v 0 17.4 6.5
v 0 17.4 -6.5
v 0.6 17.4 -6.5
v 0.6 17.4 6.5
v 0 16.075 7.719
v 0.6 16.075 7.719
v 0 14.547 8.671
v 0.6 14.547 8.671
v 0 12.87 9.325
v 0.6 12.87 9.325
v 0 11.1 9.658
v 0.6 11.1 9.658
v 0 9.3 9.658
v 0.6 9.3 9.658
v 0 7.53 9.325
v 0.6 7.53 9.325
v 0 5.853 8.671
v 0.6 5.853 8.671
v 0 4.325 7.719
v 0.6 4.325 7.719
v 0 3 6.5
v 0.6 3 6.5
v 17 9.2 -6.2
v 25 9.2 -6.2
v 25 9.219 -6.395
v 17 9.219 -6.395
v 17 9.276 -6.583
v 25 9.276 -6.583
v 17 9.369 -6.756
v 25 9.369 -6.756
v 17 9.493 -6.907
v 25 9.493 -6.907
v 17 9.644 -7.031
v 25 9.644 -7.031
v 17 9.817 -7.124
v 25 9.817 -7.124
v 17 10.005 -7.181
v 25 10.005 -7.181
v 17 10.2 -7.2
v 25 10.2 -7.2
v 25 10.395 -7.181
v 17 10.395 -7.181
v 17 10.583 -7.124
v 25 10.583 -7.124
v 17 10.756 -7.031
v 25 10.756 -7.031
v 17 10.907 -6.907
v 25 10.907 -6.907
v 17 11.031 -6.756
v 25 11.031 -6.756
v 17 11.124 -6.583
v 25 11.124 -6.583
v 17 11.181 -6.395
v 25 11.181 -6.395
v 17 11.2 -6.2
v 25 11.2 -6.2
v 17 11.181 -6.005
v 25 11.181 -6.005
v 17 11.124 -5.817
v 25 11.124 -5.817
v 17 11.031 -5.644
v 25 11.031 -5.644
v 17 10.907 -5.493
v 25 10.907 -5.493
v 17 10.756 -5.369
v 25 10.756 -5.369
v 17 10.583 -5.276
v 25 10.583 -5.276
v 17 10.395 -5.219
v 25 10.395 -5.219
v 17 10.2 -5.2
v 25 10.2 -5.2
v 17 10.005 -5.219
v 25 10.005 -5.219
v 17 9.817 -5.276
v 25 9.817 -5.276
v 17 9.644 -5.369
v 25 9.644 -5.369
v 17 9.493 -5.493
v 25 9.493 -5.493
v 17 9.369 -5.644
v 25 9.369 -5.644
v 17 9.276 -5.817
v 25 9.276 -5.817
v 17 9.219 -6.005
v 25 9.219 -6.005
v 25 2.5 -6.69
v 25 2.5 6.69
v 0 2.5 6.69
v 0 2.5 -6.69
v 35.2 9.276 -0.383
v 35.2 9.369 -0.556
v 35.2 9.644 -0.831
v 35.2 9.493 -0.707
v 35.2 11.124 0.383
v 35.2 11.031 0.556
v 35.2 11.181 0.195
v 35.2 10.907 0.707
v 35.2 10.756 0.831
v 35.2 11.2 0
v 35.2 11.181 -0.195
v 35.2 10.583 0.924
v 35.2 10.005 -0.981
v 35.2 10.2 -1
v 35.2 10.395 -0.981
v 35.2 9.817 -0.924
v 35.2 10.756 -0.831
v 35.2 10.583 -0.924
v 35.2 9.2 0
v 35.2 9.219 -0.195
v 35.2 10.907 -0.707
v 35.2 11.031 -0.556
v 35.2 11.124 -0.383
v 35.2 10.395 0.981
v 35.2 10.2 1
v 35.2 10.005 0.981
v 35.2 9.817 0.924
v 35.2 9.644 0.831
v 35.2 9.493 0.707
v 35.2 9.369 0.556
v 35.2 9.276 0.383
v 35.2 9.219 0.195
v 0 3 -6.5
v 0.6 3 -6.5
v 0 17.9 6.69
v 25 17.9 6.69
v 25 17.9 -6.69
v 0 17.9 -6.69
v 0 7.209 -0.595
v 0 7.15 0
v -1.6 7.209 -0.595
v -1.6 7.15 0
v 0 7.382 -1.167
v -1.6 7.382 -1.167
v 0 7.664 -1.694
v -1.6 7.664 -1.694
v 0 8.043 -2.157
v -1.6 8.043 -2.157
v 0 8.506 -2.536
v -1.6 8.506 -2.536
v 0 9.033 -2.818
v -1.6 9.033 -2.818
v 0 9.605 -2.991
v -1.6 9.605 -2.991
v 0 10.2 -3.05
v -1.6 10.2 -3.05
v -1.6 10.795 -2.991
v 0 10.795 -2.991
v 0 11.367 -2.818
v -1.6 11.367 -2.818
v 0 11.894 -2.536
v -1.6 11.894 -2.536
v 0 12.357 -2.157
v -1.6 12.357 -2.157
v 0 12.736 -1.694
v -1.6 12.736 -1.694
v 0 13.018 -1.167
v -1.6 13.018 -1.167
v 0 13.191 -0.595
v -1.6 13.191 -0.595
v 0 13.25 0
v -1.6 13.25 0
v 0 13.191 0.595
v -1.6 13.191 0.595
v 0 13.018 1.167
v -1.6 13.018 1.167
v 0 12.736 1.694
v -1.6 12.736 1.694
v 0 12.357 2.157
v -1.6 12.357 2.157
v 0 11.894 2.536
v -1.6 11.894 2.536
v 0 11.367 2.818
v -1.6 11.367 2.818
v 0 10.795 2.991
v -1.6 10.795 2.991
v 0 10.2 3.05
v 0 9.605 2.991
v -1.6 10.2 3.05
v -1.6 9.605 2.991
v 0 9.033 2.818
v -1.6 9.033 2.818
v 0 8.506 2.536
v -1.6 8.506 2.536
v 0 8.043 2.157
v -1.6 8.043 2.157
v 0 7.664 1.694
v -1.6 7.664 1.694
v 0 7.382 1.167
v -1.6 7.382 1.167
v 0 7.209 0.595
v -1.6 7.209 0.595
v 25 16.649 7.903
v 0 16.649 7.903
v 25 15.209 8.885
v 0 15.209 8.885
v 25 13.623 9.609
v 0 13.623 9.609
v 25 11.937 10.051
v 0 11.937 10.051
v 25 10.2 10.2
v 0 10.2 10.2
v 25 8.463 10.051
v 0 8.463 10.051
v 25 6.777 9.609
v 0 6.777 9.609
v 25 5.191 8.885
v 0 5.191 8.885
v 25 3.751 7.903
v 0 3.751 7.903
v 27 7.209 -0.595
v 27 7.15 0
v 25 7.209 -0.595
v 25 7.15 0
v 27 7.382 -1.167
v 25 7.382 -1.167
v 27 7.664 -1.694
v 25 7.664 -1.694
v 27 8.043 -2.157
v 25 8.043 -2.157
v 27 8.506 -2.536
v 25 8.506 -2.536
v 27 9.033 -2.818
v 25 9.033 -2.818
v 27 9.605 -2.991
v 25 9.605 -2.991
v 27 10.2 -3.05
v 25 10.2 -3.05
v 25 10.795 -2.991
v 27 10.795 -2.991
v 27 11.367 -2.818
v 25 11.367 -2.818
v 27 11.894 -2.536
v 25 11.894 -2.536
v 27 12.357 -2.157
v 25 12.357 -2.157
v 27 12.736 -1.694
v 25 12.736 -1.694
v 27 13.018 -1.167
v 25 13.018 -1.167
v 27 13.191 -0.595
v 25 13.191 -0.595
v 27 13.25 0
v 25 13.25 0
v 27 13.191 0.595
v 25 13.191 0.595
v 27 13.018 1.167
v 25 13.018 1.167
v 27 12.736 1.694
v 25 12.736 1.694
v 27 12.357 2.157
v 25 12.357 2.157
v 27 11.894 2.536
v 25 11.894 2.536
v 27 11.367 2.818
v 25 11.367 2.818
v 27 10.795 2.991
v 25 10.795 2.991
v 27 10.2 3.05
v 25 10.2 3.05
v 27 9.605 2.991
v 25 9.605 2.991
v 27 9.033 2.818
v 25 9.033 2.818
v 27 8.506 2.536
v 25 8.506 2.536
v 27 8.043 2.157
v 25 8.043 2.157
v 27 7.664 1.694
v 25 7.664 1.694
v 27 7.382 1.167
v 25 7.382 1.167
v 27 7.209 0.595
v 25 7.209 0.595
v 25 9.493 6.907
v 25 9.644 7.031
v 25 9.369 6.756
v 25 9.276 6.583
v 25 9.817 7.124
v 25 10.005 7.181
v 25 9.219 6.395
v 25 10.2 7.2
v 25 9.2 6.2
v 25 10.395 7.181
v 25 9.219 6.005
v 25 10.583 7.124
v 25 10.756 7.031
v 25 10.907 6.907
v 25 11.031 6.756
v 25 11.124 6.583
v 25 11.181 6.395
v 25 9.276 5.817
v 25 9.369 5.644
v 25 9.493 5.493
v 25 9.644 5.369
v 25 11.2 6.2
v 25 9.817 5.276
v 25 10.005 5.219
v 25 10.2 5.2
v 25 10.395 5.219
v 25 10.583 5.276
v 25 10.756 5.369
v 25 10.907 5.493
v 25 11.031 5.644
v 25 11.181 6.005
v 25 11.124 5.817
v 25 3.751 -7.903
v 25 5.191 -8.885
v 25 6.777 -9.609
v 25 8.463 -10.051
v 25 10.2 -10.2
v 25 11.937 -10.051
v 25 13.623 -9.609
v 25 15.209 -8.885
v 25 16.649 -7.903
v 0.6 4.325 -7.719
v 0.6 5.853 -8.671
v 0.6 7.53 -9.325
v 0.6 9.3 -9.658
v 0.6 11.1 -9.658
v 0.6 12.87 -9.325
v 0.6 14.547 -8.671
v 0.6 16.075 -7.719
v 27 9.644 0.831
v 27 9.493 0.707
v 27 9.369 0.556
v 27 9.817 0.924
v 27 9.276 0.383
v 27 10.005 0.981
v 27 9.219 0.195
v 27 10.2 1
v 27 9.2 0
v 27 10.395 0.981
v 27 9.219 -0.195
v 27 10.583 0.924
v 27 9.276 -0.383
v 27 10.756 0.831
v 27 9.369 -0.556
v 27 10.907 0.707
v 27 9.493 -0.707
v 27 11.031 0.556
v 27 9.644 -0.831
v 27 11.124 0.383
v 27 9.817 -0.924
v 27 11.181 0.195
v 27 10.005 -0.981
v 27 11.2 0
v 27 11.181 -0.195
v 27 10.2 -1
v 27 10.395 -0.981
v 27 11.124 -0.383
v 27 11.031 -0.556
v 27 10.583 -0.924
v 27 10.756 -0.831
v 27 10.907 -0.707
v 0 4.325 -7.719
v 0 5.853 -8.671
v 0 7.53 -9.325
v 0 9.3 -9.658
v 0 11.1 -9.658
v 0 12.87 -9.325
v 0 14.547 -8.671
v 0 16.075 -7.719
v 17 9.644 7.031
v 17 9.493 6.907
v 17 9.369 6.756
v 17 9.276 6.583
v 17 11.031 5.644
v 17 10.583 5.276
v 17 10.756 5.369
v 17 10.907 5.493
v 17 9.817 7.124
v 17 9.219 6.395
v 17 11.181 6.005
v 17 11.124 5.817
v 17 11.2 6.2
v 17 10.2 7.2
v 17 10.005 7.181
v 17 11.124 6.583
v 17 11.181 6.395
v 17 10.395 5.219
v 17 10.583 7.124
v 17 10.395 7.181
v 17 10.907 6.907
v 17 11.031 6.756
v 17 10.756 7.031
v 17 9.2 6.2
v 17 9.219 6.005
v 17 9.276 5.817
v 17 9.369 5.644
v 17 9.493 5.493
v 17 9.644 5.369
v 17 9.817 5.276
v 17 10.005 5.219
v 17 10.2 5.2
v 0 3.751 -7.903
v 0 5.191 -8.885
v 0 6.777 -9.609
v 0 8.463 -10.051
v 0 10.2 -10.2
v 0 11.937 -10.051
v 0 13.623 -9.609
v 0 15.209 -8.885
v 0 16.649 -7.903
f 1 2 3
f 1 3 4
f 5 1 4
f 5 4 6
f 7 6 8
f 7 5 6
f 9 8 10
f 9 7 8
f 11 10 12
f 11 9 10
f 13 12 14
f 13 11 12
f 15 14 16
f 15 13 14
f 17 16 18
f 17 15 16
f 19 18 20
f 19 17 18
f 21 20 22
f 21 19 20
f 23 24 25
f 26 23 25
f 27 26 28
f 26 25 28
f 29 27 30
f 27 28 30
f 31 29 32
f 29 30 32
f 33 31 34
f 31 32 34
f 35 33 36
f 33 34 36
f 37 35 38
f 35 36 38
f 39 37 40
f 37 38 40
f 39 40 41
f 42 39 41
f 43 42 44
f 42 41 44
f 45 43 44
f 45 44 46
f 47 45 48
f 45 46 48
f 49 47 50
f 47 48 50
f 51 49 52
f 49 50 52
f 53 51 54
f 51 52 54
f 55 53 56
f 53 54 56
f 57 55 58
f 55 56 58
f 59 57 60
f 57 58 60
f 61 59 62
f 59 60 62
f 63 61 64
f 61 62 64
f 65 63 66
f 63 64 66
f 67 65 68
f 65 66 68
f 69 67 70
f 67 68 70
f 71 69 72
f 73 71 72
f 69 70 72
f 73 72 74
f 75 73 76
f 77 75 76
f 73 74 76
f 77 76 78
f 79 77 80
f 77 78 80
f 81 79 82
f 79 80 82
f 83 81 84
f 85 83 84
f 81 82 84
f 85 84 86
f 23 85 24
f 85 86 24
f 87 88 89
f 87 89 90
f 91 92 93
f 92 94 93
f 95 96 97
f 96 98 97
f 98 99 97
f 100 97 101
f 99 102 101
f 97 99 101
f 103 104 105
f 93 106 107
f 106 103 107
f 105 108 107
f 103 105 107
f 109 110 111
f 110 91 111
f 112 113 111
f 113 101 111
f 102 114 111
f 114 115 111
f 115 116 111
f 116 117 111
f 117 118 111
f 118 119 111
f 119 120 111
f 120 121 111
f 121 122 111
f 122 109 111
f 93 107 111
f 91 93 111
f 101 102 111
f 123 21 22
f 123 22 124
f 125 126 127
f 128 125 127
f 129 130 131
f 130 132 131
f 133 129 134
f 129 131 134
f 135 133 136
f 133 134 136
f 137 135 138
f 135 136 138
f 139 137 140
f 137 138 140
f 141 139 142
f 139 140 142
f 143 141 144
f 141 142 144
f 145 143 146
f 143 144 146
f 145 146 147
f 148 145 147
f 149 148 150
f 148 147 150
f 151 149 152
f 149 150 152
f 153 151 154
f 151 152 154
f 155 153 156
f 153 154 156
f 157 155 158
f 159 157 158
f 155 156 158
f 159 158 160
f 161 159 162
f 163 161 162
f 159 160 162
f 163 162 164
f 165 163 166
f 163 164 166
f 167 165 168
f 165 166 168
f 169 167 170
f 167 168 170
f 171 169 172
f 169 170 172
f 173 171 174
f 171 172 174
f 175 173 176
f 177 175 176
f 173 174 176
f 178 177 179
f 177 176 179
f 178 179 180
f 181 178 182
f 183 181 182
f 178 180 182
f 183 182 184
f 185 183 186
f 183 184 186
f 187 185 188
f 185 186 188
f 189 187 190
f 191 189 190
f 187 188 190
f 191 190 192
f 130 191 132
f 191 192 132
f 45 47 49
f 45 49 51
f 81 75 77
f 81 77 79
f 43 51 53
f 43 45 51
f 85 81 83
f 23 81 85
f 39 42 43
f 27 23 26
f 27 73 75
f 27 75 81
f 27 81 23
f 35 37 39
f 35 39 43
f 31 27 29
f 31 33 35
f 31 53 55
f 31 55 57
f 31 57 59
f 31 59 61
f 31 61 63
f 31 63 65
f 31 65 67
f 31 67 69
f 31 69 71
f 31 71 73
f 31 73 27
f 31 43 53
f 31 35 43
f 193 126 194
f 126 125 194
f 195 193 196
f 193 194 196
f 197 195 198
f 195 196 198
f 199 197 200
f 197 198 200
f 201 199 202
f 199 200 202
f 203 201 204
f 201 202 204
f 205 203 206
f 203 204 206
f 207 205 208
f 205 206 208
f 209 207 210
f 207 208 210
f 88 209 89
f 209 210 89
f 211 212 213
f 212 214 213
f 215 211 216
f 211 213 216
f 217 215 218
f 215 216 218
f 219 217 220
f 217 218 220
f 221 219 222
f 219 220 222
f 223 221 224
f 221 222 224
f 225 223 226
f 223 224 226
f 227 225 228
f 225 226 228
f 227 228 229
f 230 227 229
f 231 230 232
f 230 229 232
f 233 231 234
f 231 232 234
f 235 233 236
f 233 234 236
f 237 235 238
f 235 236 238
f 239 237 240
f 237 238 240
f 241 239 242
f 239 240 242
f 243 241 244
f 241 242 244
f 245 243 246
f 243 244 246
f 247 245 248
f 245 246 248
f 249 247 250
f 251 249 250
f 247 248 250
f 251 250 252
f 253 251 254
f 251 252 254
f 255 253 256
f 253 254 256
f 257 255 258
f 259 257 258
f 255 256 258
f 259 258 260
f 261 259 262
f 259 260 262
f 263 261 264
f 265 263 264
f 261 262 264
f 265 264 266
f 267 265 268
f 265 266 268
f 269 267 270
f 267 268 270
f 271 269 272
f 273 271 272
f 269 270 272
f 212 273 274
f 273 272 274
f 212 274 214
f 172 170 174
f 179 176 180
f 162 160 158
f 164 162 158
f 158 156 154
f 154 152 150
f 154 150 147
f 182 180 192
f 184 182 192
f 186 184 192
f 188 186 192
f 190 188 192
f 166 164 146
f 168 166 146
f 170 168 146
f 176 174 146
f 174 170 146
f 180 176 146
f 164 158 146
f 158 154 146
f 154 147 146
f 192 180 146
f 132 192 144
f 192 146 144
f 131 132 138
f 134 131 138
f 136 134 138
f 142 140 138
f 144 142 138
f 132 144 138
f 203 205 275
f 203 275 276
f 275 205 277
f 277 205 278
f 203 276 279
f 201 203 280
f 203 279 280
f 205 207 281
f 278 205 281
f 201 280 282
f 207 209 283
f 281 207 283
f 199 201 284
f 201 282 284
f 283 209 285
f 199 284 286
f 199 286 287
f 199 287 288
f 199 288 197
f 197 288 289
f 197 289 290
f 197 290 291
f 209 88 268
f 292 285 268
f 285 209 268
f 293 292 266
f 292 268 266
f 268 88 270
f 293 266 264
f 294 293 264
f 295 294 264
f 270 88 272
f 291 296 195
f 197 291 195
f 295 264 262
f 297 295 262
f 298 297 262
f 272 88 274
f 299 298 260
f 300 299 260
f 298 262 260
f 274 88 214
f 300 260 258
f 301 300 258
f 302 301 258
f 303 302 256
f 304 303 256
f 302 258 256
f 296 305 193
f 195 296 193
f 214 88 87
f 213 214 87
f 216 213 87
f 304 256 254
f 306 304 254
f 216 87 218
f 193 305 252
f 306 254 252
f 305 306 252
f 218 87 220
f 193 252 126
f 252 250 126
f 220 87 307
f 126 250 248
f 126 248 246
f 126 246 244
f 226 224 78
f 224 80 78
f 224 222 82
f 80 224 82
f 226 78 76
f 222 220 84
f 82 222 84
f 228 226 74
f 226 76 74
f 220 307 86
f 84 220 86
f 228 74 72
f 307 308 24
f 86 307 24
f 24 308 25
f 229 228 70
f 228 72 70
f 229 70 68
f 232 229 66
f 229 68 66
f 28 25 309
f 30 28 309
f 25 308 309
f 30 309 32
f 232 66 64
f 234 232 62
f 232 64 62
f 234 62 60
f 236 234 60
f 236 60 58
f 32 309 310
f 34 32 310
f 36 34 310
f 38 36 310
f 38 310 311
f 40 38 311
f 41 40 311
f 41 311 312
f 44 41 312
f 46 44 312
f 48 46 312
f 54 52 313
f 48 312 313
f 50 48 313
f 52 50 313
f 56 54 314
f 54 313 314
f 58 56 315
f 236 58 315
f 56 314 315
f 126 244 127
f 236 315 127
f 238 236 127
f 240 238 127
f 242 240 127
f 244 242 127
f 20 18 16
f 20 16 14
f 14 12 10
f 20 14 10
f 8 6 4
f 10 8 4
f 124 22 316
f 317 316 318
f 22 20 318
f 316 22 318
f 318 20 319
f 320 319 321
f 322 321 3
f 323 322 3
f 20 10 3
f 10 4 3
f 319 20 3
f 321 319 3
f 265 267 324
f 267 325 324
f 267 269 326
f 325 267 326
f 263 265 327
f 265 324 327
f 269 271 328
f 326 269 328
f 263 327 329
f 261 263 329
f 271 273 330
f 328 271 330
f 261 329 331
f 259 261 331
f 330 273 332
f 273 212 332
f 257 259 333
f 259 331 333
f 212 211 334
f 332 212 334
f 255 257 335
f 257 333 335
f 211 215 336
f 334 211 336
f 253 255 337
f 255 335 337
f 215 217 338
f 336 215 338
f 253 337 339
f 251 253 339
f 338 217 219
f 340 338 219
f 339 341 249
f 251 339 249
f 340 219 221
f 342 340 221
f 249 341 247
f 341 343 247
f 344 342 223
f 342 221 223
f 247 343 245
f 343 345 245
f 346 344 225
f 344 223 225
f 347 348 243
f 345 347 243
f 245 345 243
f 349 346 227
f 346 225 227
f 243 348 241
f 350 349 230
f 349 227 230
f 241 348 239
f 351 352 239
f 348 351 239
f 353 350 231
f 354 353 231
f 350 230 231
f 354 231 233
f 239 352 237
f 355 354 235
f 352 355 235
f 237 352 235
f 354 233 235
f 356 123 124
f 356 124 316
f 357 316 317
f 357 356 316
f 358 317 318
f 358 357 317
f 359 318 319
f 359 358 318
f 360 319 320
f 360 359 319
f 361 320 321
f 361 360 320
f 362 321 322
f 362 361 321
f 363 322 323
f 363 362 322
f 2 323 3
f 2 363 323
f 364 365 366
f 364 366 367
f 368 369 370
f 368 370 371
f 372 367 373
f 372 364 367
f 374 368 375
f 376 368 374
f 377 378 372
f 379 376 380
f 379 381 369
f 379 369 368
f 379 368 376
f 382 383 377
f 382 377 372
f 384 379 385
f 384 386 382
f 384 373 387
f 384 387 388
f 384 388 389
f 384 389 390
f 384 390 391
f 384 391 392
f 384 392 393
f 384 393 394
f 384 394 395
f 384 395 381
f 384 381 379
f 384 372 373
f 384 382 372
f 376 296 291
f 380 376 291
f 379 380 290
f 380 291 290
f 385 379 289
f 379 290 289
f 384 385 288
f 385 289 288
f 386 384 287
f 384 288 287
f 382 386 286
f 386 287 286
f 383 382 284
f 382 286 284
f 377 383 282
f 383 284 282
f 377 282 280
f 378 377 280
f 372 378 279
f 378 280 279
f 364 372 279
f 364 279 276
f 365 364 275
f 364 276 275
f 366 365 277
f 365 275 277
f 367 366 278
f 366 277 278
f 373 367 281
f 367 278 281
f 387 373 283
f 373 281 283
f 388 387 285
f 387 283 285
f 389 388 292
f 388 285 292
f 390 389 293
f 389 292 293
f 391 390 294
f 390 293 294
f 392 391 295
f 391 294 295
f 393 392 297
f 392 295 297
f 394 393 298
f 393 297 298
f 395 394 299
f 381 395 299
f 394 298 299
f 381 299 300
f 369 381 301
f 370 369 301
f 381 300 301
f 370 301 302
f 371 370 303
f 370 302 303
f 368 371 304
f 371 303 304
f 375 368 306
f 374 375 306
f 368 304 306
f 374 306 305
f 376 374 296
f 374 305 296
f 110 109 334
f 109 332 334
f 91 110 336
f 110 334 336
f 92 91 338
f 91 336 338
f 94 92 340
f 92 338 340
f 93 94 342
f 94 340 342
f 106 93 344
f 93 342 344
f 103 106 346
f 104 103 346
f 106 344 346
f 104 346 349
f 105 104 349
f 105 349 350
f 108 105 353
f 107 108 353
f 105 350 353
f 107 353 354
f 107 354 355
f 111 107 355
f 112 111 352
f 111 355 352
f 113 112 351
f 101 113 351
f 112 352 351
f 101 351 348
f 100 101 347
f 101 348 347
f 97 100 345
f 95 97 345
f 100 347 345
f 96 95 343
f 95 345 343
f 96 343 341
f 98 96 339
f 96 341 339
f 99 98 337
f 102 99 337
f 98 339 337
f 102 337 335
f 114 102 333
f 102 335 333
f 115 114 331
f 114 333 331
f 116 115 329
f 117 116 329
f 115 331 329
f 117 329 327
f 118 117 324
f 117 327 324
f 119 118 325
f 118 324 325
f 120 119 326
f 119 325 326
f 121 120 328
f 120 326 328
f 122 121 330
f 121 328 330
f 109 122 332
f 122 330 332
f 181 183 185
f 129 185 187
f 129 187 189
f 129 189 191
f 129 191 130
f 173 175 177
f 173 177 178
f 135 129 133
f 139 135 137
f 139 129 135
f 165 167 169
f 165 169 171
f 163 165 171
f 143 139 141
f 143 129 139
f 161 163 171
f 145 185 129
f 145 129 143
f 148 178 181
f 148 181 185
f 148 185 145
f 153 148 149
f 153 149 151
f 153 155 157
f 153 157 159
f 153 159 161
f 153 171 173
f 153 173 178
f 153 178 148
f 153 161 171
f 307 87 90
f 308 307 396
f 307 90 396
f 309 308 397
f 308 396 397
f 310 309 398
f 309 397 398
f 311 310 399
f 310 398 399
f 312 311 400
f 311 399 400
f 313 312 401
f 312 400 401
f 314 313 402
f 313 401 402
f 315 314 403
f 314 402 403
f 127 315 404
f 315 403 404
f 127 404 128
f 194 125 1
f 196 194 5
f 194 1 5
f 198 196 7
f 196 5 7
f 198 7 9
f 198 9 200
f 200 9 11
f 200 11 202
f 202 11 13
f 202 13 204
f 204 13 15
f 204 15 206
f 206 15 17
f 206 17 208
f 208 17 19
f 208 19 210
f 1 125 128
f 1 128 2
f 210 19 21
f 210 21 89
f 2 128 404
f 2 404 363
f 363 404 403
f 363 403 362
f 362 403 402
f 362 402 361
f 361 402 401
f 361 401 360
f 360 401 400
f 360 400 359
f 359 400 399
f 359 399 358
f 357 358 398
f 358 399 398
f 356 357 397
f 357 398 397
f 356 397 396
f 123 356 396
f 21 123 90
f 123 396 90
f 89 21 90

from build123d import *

# Parameters (mm, degrees)
CUT_EXTRUDE_START   = -36
CUT_EXTRUDE_1_DEPTH = 36
SKETCH_3_R          = 1
CUT_EXTRUDE_2_DEPTH = 8
CUT_EXTRUDE_4_DEPTH = 0.6


with BuildPart() as part:
    # 草图1 → 旋转3 (revolve)
    with BuildSketch(Plane.XY):
        Polygon((25, 7.15), (25, 0), (0, 0), (0, 7.15), (-1.6, 7.15), (-1.6, 10.2), (35.2, 10.2), (35.2, 9.2), (27, 9.2), (27, 7.15), align=None)
    revolve(axis=Axis((-1.6, 10.2, 0), (1, 0, 0)))

    # 草图2 → 切除-拉伸1 (cut)
    with BuildSketch(Plane(origin=(25, 0, 0), x_dir=(0, 0, -1), z_dir=(1, 0, 0)).offset(CUT_EXTRUDE_START)):
        with BuildLine():
            Line((-6.68954408, 17.9), (6.68954408, 17.9))
            ThreePointArc((6.68954408, 17.9), (0, 20.4), (-6.68954408, 17.9))
        make_face()
        with BuildLine():
            Line((-6.68954408, 2.5), (6.68954408, 2.5))
            ThreePointArc((6.68954408, 2.5), (0, 0), (-6.68954408, 2.5))
        make_face()
    extrude(amount=CUT_EXTRUDE_1_DEPTH, mode=Mode.SUBTRACT)

    # 草图3 → 切除-拉伸2 (cut)
    with BuildSketch(Plane(origin=(25, 0, 0), x_dir=(0, 0, -1), z_dir=(1, 0, 0))):
        with Locations(Location((-6.2, 10.2, 0), (0, 0, 90))):
            Circle(SKETCH_3_R)
        with Locations(Location((6.2, 10.2, 0), (0, 0, 270))):
            Circle(SKETCH_3_R)
    extrude(amount=-CUT_EXTRUDE_2_DEPTH, mode=Mode.SUBTRACT)

    # 草图4 → 切除-拉伸4 (cut)
    with BuildSketch(Plane.ZY):
        with BuildLine():
            Line((6.5, 3), (-6.5, 3))
            ThreePointArc((-6.5, 3), (-9.7, 10.2), (-6.5, 17.4))
            Line((-6.5, 17.4), (6.5, 17.4))
            ThreePointArc((6.5, 17.4), (9.7, 10.2), (6.5, 3))
        make_face()
    extrude(amount=-CUT_EXTRUDE_4_DEPTH, mode=Mode.SUBTRACT)


with BuildPart() as cut_extrude_4_piece_1:
    # of the separate pieces the step leaves, piece 1, a body of its own (cut_extrude_4_pieces)
    add(part.part.solids().sort_by_distance((25, 2.5, -6.68954408))[0])


with BuildPart() as cut_extrude_4_piece_2:
    # of the separate pieces the step leaves, piece 2, a body of its own (cut_extrude_4_pieces)
    add(part.part.solids().sort_by_distance((0, 7.15, 0))[0])


solid = Compound([cut_extrude_4_piece_1.part, cut_extrude_4_piece_2.part])
